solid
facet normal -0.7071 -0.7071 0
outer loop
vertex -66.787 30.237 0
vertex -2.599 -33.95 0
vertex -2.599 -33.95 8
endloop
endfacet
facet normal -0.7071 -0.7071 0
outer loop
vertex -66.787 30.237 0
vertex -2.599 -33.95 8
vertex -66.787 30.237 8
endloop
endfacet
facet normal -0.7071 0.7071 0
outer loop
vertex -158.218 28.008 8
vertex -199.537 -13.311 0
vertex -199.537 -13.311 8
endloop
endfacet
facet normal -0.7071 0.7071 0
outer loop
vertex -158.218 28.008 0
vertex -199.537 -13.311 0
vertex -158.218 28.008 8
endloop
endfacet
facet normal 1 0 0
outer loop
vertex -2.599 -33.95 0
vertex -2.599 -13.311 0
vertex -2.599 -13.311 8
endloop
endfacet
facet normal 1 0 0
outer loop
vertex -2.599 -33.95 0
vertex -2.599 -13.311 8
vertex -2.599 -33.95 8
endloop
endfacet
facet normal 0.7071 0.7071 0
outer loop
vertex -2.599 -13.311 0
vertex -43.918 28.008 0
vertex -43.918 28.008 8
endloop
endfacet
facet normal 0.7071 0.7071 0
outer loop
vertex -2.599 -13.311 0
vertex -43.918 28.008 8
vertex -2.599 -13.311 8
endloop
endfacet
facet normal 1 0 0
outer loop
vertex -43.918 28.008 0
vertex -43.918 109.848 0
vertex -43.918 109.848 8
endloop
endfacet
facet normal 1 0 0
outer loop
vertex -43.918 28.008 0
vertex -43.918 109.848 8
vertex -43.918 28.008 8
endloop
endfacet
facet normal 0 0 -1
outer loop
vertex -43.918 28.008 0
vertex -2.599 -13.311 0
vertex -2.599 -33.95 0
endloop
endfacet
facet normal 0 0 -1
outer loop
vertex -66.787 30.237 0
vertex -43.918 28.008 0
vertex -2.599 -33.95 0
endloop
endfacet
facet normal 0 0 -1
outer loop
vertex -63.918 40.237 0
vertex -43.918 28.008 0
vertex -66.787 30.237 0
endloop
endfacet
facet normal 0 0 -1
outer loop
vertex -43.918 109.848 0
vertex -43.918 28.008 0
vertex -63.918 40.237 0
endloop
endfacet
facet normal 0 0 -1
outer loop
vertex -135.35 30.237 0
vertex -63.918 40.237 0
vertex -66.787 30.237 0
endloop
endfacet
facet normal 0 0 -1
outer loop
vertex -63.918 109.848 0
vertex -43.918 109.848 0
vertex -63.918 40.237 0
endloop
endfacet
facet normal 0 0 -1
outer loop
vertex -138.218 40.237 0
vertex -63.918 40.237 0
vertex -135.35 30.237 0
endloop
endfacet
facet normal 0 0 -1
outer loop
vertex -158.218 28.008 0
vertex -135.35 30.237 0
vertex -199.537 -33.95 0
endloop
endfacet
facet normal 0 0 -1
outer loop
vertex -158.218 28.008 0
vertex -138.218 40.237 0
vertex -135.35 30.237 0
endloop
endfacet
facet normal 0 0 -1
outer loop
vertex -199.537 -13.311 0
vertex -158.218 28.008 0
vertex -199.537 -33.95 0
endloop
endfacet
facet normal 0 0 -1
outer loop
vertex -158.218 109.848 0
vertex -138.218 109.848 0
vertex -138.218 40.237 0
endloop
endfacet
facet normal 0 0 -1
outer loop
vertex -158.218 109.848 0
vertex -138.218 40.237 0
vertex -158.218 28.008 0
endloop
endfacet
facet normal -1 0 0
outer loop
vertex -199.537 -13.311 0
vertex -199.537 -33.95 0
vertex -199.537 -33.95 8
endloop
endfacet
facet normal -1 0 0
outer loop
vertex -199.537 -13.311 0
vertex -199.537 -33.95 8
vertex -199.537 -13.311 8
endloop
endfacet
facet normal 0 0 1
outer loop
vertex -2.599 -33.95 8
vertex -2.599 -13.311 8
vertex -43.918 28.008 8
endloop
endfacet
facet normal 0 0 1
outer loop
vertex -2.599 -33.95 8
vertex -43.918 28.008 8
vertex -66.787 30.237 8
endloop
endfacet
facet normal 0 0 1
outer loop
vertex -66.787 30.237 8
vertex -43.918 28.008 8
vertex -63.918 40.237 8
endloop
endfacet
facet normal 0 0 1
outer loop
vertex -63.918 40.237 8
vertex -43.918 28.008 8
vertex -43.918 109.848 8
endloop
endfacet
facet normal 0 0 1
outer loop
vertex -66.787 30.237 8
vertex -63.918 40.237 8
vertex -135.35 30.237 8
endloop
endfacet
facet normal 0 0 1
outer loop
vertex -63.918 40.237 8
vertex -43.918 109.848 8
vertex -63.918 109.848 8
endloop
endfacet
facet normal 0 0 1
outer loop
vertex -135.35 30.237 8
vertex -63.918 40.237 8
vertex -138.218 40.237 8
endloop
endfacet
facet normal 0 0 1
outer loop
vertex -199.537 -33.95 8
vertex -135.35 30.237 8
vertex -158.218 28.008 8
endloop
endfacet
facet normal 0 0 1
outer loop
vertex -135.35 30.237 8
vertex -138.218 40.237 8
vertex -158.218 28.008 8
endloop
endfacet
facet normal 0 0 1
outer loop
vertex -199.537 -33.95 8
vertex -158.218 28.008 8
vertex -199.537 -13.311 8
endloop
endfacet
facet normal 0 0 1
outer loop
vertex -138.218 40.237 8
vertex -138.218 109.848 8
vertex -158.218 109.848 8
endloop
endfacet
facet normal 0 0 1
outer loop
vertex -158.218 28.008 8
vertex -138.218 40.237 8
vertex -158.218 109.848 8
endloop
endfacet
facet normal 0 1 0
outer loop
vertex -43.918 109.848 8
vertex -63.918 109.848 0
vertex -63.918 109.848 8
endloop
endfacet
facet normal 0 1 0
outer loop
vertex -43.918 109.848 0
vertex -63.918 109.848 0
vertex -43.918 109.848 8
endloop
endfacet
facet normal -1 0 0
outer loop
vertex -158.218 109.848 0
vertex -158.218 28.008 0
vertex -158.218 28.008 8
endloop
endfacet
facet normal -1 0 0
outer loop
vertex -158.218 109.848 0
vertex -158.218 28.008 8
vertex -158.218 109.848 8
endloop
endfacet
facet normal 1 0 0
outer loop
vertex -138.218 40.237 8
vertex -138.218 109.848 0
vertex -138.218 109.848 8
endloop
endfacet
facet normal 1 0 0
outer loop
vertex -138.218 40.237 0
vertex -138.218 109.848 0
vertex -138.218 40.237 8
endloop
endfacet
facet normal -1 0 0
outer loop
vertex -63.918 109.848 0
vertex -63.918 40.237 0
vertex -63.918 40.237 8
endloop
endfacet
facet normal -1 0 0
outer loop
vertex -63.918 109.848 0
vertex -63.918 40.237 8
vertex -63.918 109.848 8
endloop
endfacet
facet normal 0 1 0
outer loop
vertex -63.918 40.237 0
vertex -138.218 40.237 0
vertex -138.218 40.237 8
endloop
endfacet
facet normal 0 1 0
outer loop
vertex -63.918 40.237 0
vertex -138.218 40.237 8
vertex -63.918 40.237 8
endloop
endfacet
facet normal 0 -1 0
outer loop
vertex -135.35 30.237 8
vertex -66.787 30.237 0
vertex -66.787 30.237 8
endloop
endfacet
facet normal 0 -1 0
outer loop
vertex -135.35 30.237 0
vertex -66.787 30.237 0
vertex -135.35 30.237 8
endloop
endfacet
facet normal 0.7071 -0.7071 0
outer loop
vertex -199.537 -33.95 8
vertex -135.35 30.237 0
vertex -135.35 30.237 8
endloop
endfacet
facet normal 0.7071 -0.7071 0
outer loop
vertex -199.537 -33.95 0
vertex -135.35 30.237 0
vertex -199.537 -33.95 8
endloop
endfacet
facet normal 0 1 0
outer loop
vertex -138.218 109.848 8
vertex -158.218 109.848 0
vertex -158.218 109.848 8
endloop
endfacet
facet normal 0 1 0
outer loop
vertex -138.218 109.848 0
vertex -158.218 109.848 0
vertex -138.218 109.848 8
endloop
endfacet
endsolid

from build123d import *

# Parameters (mm, degrees)
BOSS_EXTRU_1_DEPTH = 8


with BuildPart() as part:
    # Esquisse1 → Boss.-Extru.1 (new body)
    with BuildSketch(Plane(origin=(0, 0, 0), x_dir=(-1, 0, 0), z_dir=(0, 0, -1))):
        Polygon((43.918221478, 28.008066704), (2.599421562, -13.310733211), (2.599421562, -33.949941515), (66.786548928, 30.237185851), (135.349894027, 30.237185851), (199.537021393, -33.949941515), (199.537021393, -13.310733211), (158.218221478, 28.008066704), (158.218221478, 109.848159974), (138.218221478, 109.848159974), (138.218221478, 40.237185851), (63.918221478, 40.237185851), (63.918221478, 109.848159974), (43.918221478, 109.848159974), align=None)
    extrude(amount=-BOSS_EXTRU_1_DEPTH)


solid = part.part
